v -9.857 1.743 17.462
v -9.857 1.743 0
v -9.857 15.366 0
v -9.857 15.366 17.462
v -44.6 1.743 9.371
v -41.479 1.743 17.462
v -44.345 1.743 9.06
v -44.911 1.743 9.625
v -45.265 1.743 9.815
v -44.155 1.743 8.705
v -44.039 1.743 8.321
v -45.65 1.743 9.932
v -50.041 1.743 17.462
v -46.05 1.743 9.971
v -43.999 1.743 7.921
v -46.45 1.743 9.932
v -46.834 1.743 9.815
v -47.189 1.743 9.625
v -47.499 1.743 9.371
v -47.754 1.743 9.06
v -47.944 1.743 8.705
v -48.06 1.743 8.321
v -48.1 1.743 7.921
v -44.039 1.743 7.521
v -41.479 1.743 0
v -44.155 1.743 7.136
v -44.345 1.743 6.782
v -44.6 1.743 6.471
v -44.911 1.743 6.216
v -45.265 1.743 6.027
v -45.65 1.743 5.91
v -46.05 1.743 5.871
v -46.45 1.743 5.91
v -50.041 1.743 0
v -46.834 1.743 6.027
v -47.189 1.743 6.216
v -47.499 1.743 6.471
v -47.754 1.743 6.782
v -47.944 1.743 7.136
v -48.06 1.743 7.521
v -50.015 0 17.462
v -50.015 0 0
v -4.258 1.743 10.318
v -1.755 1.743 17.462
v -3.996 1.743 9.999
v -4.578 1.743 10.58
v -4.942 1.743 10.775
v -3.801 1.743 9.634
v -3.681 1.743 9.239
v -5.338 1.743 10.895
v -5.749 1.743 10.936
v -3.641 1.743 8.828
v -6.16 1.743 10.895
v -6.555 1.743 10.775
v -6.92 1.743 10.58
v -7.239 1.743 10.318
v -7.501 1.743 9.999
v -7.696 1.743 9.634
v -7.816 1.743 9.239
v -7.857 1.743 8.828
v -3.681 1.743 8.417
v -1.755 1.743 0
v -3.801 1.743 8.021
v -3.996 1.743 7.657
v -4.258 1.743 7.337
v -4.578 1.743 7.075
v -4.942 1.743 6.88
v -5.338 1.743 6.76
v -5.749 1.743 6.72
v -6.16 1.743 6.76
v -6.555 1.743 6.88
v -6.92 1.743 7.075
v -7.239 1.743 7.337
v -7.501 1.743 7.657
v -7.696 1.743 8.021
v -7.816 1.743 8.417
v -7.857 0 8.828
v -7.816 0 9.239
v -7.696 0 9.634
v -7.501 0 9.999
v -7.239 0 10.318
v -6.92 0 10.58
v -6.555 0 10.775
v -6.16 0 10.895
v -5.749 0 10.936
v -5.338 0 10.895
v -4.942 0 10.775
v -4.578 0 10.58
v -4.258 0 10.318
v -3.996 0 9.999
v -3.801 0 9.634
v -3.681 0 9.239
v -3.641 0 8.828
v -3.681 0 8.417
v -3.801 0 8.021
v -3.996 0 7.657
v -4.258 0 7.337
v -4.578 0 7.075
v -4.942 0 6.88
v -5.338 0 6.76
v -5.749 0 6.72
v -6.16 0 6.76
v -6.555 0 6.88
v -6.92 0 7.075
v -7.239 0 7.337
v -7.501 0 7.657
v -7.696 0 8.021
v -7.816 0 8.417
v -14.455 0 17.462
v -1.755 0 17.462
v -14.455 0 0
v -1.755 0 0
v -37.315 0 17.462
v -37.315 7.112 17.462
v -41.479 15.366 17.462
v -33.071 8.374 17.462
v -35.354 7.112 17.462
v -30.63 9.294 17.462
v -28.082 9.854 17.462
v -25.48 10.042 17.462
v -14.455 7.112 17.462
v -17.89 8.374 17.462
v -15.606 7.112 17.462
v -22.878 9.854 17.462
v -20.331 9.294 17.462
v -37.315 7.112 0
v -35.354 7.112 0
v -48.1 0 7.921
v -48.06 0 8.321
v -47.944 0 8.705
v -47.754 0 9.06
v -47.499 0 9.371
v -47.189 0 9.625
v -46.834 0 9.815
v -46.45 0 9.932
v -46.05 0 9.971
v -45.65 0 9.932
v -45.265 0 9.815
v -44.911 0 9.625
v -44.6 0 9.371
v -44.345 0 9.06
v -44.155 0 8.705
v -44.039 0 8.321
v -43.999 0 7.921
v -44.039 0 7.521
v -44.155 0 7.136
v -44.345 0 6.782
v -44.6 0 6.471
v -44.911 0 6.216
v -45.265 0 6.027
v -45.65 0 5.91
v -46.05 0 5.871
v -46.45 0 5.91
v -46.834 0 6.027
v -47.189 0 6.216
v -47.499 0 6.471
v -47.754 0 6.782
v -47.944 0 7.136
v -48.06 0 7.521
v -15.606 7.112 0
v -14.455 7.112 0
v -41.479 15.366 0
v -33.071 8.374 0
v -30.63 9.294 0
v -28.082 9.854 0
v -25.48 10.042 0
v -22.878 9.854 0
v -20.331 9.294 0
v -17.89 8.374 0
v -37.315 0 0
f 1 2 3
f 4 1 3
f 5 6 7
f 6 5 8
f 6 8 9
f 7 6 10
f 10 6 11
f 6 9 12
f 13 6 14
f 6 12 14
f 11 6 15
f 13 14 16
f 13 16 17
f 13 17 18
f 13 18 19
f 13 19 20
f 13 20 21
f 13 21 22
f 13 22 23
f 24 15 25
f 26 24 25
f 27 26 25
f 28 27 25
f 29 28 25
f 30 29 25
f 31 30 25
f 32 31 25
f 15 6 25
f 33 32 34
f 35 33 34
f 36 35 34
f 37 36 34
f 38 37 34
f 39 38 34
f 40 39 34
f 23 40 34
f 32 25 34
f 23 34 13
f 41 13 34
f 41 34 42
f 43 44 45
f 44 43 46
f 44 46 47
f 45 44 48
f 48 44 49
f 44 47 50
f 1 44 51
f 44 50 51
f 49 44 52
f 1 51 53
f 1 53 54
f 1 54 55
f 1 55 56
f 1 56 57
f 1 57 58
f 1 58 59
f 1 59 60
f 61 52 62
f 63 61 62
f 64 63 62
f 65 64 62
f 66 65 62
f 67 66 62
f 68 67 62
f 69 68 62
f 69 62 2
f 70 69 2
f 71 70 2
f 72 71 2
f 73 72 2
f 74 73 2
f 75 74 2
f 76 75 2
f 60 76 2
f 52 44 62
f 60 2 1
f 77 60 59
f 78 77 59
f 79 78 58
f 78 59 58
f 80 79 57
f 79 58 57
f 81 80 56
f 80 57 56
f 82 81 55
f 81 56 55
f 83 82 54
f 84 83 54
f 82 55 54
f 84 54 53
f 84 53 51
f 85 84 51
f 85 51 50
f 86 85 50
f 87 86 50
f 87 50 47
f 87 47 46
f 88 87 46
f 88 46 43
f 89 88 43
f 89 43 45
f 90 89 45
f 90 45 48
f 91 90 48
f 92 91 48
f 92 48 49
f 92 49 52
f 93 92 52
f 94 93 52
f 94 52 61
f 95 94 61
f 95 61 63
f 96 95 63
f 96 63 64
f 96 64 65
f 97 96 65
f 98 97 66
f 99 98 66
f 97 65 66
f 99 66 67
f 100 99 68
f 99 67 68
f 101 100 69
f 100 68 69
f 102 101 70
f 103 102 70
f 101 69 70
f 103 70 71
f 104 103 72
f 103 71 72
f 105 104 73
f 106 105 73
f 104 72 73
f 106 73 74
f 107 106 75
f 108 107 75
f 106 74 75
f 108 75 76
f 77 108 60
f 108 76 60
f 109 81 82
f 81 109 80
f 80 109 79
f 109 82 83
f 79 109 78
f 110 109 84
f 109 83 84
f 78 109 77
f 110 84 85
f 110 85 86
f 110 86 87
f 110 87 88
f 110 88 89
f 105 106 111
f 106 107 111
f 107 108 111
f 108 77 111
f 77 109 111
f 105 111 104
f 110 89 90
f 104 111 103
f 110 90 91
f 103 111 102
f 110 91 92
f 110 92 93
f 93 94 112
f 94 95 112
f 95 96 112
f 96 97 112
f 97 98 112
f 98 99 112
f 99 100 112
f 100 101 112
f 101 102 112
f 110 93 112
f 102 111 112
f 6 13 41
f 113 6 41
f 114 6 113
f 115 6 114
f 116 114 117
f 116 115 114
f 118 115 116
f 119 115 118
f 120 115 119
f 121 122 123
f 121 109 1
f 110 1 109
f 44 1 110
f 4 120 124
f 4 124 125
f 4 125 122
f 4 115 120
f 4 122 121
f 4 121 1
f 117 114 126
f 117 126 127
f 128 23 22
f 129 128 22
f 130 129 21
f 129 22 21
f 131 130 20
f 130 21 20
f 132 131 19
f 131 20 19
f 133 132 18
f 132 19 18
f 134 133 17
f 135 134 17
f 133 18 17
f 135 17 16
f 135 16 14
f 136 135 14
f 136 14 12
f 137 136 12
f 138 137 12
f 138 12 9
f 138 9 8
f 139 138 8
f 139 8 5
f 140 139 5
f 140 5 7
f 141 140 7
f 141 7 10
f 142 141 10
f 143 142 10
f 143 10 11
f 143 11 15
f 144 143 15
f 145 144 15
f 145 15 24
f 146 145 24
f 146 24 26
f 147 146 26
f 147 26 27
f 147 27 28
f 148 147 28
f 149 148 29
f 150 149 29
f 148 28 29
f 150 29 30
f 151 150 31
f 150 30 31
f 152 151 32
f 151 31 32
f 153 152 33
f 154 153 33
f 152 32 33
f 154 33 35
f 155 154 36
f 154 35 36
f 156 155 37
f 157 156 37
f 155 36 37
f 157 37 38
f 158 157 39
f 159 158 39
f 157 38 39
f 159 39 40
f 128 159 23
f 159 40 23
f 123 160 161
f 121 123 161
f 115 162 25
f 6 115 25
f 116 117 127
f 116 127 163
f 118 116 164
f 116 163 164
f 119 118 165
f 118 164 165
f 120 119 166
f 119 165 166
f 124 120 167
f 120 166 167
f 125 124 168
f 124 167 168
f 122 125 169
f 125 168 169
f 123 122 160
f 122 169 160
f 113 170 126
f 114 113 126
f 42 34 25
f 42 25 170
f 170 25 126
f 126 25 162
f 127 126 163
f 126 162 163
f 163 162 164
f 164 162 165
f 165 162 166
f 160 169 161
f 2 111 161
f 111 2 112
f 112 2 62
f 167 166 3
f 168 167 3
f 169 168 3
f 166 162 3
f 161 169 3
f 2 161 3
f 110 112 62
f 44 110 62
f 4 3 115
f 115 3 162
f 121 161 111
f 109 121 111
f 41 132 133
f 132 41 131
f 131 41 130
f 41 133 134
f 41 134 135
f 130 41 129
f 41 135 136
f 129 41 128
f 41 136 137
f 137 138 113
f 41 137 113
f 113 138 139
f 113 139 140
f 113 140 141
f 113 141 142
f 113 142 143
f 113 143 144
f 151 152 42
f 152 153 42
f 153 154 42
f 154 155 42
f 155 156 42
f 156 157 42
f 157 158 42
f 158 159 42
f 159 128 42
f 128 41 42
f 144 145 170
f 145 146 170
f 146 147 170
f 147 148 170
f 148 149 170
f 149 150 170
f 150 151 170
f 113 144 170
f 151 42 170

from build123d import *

# Parameters (mm, degrees)
F1_DEPTH = 17.4625
F2_R     = 2.1078217737
F3_DEPTH = 25.4
F4_R     = 2.0502205364
F5_DEPTH = 25.4
F7_DEPTH = 25.4


# Not quite as in the source:
# - a length typed as a fraction of an inch, garbled in the dataset ("3 / 203.2 mm" for 3/8 in), is restored
# - a feature names something its author has since deleted; it is built from what else it names


with BuildPart() as f1:
    # F0 (on Top) → F1 (new body)
    with BuildSketch(Plane.XY):
        Polygon((-14.4545807227, 0), (-1.7545807227, 0), (-1.7545807227, 1.7429942964), (-9.8568759859, 1.7429942964), (-9.8568759859, 15.3656043112), (-41.4793491364, 15.3656043112), (-41.4793491364, 1.7429942964), (-50.0414928719, 1.7429942964), (-50.0145807227, 0), (-37.3145807227, 0), (-37.3145807227, 7.112), (-14.4545807227, 7.112), align=None)
    extrude(amount=F1_DEPTH)

    # F2 (on face) → F3 (cut)
    with BuildSketch(Plane(origin=(0, 1.7429942964, 0), x_dir=(-1, 0, 0), z_dir=(0, 1, 0))):
        with Locations((5.7487357408, 8.8277282193)):
            Circle(F2_R)
    extrude(amount=-F3_DEPTH, mode=Mode.SUBTRACT)

    # F4 (on face) → F5 (cut)
    with BuildSketch(Plane(origin=(0, 1.7429942964, 0), x_dir=(-1, 0, 0), z_dir=(0, 1, 0))):
        with Locations((46.049553901, 7.9207858071)):
            Circle(F4_R)
    extrude(amount=-F5_DEPTH, mode=Mode.SUBTRACT)

    # F6 (on face) → F7 (cut)
    with BuildSketch(Plane(origin=(0, 0, 0), x_dir=(1, 0, 0), z_dir=(0, 0, -1))):
        with BuildLine():
            Line((-15.6063264408, -7.112), (-35.3541379623, -7.112))
            ThreePointArc((-35.3541379623, -7.112), (-25.4802322015, -10.0417717978), (-15.6063264408, -7.112))
        make_face()
    extrude(amount=-F7_DEPTH, mode=Mode.SUBTRACT)


solid = f1.part
